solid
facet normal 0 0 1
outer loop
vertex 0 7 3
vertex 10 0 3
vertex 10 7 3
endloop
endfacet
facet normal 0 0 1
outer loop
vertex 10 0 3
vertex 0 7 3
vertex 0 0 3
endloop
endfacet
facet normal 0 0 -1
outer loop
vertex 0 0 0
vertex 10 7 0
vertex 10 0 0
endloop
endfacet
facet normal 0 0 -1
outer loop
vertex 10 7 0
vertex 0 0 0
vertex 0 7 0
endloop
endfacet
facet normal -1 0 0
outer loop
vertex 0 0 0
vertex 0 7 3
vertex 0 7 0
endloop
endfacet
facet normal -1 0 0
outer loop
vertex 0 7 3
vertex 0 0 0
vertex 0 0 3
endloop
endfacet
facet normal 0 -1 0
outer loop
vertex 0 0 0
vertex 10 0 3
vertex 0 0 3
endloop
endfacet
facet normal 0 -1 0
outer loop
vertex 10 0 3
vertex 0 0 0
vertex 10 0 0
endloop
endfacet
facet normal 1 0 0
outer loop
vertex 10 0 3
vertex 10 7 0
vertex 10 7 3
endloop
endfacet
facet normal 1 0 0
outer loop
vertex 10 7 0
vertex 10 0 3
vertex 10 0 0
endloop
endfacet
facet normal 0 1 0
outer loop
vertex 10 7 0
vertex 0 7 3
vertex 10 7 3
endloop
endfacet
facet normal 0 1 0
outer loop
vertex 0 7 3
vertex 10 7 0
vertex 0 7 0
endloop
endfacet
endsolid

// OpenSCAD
translate([2.5, 1.0, 1.5]) color([0.7041168173823689, 0.21541959298546798, 0.26587203921552827]) cube([5, 2, 3], center=true);
translate([7.5, 1.0, 1.5]) color([0.04380725363309168, 0.16285754255803098, 0.0038745499388105342]) cube([5, 2, 3], center=true);
translate([1.0, 4.5, 1.5]) color([0.6546275765234981, 0.14040698903568194, 0.7866793455760521]) cube([2, 5, 3], center=true);
translate([3.0, 4.5, 1.5]) color([0.680503995881725, 0.9706757933544957, 0.3965144869518913]) cube([2, 5, 3], center=true);
translate([5.0, 4.5, 1.5]) color([0.9213919134510528, 0.4537041723195332, 0.3395037398362071]) cube([2, 5, 3], center=true);
translate([7.0, 4.5, 1.5]) color([0.10233886991705377, 0.8828321850718597, 0.7947901585625868]) cube([2, 5, 3], center=true);
translate([9.0, 4.5, 1.5]) color([0.3229289765350606, 0.45574438492562896, 0.32514346581324827]) cube([2, 5, 3], center=true);
